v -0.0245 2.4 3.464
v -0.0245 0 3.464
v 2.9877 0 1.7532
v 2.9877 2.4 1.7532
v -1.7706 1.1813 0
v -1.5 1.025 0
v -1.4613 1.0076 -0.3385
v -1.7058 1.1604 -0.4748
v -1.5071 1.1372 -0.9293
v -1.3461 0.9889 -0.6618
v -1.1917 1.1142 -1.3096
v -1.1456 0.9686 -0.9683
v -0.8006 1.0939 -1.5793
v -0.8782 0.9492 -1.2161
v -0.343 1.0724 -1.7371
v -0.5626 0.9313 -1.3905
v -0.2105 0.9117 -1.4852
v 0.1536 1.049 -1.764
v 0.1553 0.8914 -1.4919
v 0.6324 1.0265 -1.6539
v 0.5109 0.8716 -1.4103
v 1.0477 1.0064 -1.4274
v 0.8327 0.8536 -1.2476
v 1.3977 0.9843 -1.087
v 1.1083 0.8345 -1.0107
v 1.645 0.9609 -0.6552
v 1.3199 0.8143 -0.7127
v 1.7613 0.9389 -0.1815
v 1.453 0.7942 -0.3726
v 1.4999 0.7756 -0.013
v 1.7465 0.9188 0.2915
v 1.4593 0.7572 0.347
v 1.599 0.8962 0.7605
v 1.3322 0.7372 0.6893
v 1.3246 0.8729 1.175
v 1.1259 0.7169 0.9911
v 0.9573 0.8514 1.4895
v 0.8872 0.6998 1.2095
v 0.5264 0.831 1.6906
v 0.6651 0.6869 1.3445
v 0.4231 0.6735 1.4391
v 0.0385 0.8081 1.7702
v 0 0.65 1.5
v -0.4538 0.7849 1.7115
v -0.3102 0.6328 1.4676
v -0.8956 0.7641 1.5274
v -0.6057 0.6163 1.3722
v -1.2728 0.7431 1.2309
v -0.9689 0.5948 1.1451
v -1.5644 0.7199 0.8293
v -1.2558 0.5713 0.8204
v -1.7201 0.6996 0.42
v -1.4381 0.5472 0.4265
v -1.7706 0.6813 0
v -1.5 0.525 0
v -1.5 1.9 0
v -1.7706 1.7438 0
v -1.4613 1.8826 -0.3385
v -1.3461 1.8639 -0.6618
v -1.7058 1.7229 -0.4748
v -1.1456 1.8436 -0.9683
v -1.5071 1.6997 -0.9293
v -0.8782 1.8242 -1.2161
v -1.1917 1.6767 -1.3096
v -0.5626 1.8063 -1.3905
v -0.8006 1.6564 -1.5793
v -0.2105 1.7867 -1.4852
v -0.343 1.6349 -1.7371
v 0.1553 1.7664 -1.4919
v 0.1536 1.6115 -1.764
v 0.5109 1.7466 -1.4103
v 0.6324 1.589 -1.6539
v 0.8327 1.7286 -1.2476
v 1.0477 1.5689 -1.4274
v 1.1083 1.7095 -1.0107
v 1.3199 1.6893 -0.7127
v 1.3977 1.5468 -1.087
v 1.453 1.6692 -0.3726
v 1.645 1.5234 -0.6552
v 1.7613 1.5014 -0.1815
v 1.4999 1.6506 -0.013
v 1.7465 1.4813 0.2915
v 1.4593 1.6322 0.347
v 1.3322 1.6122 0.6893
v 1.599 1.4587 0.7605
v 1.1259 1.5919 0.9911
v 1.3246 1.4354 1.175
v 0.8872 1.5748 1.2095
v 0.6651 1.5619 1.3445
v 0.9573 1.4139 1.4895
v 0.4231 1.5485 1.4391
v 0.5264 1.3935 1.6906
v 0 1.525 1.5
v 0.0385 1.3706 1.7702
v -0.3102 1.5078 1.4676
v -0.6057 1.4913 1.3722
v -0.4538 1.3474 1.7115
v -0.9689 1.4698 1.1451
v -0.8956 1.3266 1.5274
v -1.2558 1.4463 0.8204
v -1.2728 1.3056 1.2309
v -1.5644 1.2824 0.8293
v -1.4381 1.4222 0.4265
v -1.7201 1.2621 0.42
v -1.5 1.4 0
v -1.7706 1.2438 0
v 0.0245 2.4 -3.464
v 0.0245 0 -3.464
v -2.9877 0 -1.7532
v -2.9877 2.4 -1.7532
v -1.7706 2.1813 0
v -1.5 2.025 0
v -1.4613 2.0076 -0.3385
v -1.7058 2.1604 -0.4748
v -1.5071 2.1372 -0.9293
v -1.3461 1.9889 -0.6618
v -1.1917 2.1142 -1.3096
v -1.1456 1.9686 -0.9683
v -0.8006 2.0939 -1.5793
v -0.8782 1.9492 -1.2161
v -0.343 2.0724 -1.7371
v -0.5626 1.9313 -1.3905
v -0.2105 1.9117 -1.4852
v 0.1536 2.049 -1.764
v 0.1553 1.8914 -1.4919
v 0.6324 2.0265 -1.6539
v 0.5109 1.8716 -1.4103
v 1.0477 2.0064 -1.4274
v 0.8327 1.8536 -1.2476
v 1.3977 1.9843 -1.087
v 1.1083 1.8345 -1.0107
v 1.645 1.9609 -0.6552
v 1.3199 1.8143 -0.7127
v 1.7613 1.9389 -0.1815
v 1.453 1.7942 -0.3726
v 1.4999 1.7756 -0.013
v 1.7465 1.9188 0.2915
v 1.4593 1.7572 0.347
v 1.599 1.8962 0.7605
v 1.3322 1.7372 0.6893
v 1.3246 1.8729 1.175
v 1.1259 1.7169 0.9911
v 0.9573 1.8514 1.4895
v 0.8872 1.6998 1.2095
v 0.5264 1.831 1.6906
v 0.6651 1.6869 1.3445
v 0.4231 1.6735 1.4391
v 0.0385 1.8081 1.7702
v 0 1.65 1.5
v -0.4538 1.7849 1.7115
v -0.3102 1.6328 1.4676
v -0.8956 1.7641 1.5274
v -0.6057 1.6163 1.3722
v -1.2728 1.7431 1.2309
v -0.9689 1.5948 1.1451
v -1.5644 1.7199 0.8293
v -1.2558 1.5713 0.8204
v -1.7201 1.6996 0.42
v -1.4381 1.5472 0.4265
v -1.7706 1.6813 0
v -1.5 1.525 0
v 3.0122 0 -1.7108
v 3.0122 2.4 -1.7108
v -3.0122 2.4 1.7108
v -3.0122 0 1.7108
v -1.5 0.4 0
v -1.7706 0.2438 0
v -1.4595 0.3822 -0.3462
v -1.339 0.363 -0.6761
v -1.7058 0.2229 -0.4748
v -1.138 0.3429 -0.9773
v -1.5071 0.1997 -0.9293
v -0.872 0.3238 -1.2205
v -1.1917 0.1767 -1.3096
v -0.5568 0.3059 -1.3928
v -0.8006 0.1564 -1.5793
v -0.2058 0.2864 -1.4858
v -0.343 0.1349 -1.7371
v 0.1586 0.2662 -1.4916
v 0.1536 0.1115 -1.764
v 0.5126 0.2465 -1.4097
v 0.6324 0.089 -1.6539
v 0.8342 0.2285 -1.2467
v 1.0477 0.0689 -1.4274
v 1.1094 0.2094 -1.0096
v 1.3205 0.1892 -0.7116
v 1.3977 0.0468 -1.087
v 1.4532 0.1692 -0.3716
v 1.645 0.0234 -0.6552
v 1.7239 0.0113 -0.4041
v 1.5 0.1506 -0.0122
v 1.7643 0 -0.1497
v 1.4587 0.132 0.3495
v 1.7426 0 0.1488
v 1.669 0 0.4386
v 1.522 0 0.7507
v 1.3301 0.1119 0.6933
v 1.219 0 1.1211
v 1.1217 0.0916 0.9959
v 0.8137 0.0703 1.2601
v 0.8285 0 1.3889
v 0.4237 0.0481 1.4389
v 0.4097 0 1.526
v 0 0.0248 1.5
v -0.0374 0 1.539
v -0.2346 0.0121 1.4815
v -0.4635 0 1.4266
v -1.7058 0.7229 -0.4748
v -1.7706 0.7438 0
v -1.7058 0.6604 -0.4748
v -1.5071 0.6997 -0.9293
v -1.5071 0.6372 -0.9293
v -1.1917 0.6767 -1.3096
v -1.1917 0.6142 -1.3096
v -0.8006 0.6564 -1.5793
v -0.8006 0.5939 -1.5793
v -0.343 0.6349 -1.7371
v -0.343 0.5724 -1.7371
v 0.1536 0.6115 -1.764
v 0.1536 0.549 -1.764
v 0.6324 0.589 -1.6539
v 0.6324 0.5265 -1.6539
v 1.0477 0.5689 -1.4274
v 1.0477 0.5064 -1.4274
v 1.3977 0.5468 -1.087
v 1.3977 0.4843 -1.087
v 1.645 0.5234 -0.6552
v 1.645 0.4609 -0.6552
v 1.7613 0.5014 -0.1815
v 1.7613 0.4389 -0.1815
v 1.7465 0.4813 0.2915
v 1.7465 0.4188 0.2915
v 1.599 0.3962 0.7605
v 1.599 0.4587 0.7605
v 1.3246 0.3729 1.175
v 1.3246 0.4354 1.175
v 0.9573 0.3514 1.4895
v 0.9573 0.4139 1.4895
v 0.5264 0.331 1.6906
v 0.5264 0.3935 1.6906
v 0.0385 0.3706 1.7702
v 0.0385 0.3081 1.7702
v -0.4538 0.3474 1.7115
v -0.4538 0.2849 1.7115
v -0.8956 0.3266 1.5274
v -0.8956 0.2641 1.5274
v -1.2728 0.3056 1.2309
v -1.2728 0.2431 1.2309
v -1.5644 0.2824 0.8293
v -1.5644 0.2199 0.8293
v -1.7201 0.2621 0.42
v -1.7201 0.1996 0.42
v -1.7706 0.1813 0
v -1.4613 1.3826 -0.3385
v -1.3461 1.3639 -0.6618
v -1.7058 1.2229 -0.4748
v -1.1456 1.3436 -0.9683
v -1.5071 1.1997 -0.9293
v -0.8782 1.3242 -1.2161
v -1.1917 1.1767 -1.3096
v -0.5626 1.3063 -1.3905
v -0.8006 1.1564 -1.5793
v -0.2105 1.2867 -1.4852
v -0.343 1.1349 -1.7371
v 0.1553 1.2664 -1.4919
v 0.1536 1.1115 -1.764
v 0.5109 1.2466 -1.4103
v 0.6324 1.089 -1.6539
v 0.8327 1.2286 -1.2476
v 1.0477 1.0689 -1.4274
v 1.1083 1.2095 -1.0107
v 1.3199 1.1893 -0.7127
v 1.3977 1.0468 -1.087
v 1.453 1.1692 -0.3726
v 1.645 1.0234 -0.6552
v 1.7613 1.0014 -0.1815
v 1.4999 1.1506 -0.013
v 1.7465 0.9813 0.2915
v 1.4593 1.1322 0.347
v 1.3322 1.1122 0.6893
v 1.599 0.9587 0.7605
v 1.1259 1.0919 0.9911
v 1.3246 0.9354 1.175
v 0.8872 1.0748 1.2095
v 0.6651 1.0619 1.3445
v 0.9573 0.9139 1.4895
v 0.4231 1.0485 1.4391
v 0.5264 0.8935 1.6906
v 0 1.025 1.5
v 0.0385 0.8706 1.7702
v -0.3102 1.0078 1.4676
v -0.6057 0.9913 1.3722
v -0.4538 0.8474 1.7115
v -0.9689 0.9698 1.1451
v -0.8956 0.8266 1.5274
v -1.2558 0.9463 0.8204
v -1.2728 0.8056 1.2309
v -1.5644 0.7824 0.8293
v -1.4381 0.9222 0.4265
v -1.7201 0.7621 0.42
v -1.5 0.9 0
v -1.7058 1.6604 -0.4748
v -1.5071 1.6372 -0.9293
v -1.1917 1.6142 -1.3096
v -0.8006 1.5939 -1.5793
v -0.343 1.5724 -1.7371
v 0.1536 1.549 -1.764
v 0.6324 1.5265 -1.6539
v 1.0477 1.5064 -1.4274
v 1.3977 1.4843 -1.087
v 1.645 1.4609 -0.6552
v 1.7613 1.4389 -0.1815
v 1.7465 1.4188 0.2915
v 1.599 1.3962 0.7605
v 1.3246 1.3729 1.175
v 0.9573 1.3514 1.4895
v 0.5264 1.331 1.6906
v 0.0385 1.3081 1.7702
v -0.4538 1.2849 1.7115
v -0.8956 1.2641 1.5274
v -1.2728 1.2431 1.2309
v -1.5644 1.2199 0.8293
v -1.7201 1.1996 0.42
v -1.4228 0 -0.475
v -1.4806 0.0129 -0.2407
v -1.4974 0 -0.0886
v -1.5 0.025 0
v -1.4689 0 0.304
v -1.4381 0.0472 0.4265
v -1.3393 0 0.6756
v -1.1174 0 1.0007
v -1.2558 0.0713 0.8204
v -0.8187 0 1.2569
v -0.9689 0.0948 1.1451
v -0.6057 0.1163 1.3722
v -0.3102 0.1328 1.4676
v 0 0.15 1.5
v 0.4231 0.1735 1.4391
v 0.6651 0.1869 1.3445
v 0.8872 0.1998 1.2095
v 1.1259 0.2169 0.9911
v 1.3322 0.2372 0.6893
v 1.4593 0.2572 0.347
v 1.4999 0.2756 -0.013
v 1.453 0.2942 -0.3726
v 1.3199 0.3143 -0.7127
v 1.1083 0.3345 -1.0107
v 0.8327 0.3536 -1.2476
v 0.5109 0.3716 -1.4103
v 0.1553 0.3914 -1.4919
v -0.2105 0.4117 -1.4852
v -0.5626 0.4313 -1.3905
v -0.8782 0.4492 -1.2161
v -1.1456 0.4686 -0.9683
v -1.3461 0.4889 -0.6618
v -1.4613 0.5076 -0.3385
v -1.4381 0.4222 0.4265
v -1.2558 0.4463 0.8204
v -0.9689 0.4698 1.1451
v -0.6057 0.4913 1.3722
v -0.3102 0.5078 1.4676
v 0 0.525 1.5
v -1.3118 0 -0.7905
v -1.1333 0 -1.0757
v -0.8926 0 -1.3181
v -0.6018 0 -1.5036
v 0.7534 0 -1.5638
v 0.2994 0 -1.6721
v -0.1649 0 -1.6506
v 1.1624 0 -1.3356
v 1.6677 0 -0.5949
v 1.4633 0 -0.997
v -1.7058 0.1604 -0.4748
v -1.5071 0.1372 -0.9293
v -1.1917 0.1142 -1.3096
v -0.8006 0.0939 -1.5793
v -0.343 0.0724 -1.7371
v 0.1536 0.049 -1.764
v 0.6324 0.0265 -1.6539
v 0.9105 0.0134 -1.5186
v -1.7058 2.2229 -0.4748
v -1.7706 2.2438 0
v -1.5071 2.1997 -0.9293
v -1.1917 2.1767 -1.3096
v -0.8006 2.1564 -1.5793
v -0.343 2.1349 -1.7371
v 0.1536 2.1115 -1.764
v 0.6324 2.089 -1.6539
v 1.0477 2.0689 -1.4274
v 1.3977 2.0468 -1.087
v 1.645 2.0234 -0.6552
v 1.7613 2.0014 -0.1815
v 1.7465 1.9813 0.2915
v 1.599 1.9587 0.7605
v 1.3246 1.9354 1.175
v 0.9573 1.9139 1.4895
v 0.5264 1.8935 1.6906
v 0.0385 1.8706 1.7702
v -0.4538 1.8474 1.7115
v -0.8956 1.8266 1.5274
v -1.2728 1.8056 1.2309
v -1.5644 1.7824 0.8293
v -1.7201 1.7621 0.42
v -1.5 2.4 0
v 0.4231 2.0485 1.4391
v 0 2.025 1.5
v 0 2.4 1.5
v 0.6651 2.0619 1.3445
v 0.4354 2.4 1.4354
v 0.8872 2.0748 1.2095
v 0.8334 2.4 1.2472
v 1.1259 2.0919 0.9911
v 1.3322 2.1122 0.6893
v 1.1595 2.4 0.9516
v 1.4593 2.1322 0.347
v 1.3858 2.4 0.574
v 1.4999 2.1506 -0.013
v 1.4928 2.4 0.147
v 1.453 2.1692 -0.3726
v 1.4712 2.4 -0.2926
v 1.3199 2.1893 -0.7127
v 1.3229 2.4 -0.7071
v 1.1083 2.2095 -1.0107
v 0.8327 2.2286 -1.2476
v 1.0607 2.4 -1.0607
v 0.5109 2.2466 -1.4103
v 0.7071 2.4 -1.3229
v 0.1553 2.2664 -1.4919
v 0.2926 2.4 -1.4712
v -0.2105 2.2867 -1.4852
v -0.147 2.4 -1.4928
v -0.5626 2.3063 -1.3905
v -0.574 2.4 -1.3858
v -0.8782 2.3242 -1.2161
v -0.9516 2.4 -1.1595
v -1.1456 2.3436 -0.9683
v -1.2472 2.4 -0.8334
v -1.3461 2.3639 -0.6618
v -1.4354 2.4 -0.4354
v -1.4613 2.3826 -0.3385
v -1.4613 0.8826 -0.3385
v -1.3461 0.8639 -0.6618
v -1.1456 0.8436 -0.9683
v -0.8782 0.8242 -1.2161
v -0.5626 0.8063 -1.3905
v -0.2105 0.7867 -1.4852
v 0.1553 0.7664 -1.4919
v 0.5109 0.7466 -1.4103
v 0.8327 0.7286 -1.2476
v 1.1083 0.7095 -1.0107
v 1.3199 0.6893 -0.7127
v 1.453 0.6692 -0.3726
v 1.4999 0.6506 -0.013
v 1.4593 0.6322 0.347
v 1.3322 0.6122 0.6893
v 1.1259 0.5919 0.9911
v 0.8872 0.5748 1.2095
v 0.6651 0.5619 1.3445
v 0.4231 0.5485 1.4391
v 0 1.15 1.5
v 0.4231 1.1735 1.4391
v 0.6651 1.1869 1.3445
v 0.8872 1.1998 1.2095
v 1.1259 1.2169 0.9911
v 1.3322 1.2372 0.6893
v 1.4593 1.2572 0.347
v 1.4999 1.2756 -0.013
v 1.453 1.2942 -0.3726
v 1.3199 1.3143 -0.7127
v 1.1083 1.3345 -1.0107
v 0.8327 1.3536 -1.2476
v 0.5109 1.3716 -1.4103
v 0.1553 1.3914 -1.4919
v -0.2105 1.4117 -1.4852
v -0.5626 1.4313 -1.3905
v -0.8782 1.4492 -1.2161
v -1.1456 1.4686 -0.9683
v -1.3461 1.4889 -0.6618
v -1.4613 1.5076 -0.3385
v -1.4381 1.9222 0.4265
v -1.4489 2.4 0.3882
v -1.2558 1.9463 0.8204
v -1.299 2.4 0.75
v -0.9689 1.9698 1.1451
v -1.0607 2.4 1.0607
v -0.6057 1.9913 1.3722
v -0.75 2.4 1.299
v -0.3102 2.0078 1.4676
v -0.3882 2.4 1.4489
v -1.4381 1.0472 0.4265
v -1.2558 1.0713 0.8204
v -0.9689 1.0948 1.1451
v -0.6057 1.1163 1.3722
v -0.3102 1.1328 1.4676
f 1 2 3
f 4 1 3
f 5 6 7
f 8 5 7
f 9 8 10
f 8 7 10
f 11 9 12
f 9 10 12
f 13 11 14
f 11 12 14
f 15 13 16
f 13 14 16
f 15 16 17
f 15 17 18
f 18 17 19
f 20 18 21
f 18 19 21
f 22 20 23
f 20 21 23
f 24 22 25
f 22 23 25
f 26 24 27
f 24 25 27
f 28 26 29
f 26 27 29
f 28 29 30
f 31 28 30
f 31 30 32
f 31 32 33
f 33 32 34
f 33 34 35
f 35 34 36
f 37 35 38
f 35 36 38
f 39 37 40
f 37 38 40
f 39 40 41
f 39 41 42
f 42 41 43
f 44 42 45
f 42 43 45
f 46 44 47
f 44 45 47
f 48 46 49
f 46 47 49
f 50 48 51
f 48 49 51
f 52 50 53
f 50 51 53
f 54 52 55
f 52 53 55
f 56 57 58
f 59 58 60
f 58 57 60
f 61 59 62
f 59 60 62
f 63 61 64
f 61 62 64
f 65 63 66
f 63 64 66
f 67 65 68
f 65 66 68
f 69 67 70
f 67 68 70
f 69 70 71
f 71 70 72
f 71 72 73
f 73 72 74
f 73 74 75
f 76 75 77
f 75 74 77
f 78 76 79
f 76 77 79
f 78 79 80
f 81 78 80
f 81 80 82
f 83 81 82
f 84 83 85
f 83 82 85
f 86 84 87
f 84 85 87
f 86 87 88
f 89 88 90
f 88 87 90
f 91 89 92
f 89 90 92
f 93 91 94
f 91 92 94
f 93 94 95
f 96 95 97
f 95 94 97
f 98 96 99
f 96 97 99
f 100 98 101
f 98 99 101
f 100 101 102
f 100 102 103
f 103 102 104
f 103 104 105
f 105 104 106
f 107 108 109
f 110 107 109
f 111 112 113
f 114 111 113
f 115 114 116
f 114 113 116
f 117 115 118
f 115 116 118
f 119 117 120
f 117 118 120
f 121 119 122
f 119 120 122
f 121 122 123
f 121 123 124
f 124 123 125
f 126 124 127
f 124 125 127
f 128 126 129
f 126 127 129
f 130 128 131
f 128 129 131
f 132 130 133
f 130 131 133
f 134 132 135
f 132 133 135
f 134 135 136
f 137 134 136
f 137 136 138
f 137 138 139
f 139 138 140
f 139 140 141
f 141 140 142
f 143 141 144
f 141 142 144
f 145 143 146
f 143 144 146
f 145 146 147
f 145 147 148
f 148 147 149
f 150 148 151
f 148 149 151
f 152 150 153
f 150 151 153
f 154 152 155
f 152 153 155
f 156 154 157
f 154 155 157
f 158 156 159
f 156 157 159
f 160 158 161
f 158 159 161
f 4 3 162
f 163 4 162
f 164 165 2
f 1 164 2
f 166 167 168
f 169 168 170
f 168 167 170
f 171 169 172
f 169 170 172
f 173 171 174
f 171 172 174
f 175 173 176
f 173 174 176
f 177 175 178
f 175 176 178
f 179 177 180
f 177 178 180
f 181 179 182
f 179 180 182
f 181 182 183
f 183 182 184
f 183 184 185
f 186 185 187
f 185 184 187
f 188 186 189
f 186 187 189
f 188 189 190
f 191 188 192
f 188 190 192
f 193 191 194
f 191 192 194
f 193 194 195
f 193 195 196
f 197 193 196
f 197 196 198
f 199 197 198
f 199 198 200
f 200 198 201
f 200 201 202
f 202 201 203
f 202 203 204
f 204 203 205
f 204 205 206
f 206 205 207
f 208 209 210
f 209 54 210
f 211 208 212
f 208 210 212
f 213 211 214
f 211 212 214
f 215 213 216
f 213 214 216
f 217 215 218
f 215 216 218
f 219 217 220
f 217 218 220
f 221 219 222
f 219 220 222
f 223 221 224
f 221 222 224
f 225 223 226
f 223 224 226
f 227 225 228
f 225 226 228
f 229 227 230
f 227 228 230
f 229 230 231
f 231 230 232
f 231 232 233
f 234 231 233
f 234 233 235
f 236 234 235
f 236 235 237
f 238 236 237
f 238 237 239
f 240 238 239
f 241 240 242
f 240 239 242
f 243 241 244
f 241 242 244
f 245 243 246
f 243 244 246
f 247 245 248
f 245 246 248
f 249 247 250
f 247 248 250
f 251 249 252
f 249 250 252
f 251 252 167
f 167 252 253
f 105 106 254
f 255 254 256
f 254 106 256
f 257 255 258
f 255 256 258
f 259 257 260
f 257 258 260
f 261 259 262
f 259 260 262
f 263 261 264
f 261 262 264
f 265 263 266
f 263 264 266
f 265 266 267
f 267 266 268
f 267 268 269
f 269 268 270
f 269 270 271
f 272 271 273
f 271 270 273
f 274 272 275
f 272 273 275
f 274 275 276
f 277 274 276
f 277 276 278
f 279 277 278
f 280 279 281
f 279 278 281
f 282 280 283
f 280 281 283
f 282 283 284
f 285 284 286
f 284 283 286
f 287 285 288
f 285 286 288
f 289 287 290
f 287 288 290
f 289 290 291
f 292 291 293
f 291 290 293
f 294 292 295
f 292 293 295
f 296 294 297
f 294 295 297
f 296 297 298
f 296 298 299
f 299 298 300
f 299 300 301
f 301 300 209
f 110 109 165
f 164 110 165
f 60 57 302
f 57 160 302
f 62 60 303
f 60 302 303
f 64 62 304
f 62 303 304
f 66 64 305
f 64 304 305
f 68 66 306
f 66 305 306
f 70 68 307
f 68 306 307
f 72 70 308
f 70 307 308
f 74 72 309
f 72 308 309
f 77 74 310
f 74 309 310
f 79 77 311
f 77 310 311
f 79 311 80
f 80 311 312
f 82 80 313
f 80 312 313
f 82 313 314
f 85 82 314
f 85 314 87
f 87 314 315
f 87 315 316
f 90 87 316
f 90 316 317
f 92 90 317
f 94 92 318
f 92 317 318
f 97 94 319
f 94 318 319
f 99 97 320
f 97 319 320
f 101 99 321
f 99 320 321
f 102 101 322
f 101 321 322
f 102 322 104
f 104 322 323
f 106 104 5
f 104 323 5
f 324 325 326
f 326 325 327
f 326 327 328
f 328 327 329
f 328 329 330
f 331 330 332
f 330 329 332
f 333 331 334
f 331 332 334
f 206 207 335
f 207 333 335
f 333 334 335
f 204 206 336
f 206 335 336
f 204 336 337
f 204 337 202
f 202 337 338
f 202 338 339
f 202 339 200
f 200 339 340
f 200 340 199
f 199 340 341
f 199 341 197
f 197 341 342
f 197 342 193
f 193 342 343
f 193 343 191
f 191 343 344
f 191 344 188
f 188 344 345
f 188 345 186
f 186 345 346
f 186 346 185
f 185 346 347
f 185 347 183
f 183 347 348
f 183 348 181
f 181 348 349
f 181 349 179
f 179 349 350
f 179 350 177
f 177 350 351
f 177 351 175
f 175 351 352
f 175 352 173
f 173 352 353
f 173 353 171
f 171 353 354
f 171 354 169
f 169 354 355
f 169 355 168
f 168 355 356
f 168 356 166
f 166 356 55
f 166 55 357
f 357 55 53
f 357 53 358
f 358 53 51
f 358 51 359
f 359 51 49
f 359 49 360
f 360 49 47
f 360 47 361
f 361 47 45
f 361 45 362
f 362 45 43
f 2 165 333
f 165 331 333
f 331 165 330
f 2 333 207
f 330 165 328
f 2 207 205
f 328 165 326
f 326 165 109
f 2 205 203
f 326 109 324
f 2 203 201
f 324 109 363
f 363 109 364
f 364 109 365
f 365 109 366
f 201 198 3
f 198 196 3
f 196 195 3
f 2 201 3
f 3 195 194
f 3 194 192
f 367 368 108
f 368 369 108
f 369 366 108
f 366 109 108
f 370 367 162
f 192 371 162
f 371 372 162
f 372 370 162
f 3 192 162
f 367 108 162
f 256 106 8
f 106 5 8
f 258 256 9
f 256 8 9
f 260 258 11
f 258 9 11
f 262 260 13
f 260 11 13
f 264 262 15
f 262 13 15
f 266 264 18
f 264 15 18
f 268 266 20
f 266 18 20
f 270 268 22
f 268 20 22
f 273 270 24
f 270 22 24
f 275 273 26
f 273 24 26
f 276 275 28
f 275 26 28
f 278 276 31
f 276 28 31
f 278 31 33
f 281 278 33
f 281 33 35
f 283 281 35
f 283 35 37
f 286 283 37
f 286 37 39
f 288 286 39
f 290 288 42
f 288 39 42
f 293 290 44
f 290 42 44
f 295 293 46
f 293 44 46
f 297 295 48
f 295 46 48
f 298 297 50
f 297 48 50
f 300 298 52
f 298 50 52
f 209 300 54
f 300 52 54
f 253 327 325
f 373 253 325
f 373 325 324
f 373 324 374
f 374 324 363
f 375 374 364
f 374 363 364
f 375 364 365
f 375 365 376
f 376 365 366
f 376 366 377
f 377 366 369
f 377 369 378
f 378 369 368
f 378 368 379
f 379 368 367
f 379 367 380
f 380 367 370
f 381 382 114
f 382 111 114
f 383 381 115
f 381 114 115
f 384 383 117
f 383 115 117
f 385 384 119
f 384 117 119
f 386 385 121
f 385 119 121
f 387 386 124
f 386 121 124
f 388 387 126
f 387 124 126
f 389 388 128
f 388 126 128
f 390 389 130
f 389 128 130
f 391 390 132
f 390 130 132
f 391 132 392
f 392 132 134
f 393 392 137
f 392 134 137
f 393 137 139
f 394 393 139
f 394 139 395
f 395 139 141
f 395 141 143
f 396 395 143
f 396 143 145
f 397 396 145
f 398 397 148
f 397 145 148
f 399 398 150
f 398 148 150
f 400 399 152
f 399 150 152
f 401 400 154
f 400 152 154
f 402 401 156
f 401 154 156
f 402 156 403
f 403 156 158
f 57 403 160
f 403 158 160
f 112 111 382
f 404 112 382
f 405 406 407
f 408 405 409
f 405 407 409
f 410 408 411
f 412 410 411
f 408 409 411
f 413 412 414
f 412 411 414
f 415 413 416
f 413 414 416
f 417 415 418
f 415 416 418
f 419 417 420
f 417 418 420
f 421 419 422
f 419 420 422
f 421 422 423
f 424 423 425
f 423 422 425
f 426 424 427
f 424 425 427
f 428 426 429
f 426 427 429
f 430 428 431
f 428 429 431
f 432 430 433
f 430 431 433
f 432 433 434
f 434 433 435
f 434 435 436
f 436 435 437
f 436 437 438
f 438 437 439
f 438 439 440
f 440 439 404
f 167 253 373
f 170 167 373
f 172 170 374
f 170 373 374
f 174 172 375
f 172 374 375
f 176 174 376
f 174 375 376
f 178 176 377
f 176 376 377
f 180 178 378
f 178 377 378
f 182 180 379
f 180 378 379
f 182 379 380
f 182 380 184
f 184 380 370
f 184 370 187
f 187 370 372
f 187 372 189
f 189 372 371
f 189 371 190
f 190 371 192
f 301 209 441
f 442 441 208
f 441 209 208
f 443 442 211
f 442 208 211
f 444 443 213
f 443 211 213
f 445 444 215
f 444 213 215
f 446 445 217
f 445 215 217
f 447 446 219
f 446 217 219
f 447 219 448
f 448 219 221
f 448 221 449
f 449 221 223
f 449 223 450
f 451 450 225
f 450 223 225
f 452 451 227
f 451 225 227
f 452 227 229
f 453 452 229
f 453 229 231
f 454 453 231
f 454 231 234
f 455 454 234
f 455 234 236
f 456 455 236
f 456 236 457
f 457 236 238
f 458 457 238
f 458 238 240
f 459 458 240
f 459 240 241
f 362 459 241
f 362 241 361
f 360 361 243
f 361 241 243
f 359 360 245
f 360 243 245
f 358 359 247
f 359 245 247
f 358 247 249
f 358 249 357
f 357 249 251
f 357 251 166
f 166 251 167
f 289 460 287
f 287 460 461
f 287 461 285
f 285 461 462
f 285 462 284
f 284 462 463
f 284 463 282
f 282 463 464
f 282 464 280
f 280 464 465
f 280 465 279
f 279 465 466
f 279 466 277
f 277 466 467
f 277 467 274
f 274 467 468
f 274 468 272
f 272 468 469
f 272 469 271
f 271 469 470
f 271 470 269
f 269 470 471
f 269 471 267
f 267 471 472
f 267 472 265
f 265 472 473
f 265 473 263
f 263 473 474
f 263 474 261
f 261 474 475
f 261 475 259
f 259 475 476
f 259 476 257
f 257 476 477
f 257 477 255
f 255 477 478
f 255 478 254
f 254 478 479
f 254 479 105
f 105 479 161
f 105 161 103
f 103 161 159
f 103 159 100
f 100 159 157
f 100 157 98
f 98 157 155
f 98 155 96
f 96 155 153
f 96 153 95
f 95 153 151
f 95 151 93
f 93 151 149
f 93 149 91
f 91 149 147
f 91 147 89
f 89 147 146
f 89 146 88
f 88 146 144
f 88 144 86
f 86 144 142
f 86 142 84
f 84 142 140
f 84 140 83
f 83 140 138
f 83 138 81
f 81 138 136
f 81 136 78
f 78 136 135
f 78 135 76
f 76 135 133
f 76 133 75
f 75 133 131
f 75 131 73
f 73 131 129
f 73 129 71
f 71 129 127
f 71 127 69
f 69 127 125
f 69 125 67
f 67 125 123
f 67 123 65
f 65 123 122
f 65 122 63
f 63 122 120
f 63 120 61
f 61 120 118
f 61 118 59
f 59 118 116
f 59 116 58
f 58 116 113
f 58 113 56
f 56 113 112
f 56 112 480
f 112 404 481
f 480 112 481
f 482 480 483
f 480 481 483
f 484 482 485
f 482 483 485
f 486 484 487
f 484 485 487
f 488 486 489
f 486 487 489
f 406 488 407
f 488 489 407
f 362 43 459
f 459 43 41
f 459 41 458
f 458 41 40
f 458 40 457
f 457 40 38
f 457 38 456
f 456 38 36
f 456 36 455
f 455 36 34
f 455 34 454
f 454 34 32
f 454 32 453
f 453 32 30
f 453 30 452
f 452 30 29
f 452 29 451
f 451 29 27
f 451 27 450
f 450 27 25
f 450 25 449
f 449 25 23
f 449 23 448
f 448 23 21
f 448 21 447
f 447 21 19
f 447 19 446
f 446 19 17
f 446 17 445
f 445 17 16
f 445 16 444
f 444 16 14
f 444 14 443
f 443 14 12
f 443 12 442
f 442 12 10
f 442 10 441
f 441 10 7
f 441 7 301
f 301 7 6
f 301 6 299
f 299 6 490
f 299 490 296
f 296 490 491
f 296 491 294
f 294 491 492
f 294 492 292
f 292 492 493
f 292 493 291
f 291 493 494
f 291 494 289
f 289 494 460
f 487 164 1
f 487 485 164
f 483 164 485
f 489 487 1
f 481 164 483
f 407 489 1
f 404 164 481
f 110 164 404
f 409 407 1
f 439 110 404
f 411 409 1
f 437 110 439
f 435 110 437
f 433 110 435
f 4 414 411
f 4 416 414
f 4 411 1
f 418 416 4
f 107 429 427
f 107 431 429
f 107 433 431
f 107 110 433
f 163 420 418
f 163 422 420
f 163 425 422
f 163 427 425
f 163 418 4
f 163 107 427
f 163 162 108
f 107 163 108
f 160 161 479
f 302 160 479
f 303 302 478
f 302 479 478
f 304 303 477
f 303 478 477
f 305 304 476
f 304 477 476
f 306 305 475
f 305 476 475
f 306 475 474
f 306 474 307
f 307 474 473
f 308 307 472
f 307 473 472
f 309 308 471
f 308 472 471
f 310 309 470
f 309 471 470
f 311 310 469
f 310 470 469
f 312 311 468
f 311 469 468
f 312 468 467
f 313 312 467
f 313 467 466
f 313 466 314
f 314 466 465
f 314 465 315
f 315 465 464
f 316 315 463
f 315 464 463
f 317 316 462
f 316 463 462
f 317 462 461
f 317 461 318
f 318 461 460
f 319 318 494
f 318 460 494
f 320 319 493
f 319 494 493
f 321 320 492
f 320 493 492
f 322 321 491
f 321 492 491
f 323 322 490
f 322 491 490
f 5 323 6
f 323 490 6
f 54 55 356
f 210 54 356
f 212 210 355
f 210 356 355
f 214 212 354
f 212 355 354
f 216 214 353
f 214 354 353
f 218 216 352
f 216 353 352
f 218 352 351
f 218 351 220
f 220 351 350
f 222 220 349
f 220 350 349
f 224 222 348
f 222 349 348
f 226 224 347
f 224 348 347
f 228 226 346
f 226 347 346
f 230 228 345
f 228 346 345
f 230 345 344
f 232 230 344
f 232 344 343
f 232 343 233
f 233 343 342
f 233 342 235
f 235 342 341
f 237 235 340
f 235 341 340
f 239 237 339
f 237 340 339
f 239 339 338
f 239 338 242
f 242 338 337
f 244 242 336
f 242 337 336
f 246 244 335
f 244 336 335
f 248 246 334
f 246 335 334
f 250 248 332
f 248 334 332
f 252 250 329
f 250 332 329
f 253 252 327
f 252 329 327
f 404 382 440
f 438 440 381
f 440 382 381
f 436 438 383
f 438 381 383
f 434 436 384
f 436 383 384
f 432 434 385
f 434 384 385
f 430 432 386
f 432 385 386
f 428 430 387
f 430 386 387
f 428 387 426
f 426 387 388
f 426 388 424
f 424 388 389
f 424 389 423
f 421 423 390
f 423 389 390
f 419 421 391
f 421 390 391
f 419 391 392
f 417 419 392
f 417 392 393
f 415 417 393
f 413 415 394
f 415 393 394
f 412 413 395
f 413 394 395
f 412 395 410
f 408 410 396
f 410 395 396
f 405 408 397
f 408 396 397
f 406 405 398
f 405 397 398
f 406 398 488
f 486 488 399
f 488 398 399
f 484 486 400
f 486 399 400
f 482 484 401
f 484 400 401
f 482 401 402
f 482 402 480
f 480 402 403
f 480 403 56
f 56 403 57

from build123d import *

# Parameters (mm, degrees)
BOSS_EXTRUDE1_DEPTH = 2.4
SKETCH2_R           = 1.5
CUT_EXTRUDE1_DEPTH  = 2.4
THREAD2_PITCH       = 0.5


with BuildPart() as part:
    # Sketch1 → Boss-Extrude1 (new body)
    with BuildSketch(Plane(origin=(0, 0, 0), x_dir=(1, 0, 0), z_dir=(0, 1, 0))):
        Polygon((3.012171301, 1.710796321), (0.024492575, 3.464015028), (-2.987678726, 1.753218706), (-3.012171301, -1.710796321), (-0.024492575, -3.464015028), (2.987678726, -1.753218706), align=None)
    extrude(amount=BOSS_EXTRUDE1_DEPTH)

    # Sketch2 → Cut-Extrude1 (cut)
    with BuildSketch(Plane(origin=(0, 2.4, 0), x_dir=(1, 0, 0), z_dir=(0, 1, 0))):
        with Locations(Location((0, 0, 0), (0, 0, 270))):
            Circle(SKETCH2_R)
    extrude(amount=-CUT_EXTRUDE1_DEPTH, mode=Mode.SUBTRACT)

    # Thread2: the profile of Thread Profile2 profile screwed along a right-hand helix of 4.8 turns, 6 arcs to a turn; built about Z, then put on its axis
    thread2_z = Axis((0, 0, 0), (0, 0, 1))
    thread2_corners = [(1.4997, 0, -0.000173205), (1.770632938, 0, 0.156249999), (1.770632938, 0, 0.218749999), (1.4997, 0, 0.375173204)]
    with BuildLine(mode=Mode.PRIVATE) as thread2_profile:
        Line(thread2_corners[0], thread2_corners[1])
        Line(thread2_corners[1], thread2_corners[2])
        Line(thread2_corners[2], thread2_corners[3])
        Line(thread2_corners[3], thread2_corners[0])
    thread2_cap = Face(thread2_profile.wire())
    thread2_turn_angles = [0, 30, 60, 90, 120, 150, 180, 210, 240, 270, 300, 330, 360]
    thread2_turn_weights = [1, 0.8660254037844387, 1, 0.8660254037844387, 1, 0.8660254037844387, 1, 0.8660254037844387, 1, 0.8660254037844387, 1, 0.8660254037844387, 1]
    thread2_turn_rails = [Edge.make_bspline([Vector(p[0], p[1], 0).rotate(thread2_z, thread2_turn_angles[k]) / thread2_turn_weights[k] + Vector(0, 0, p[2] + THREAD2_PITCH * thread2_turn_angles[k] / 360) for k in range(13)], [0, 0, 0, 1, 1, 2, 2, 3, 3, 4, 4, 5, 5, 6, 6, 6], 2, thread2_turn_weights) for p in thread2_corners]
    thread2_turn_sides = [Face.make_surface_from_curves(thread2_turn_rails[p[0]], thread2_turn_rails[p[1]]) for p in [(0, 1), (1, 2), (2, 3), (3, 0)]]
    thread2_last_angles = [1440, 1470, 1500, 1530, 1560, 1590, 1620, 1650, 1680, 1704, 1728]
    thread2_last_weights = [1, 0.8660254037844387, 1, 0.8660254037844387, 1, 0.8660254037844387, 1, 0.8660254037844387, 1, 0.9135454576426009, 1]
    thread2_last_rails = [Edge.make_bspline([Vector(p[0], p[1], 0).rotate(thread2_z, thread2_last_angles[k]) / thread2_last_weights[k] + Vector(0, 0, p[2] + THREAD2_PITCH * thread2_last_angles[k] / 360) for k in range(11)], [0, 0, 0, 1, 1, 2, 2, 3, 3, 4, 4, 5, 5, 5], 2, thread2_last_weights) for p in thread2_corners]
    thread2_last_sides = [Face.make_surface_from_curves(thread2_last_rails[p[0]], thread2_last_rails[p[1]]) for p in [(0, 1), (1, 2), (2, 3), (3, 0)]]
    thread2 = Plane(origin=(0, 2.4, 0), x_dir=(-1, 0, 0), z_dir=(0, -1, 0)) * Solid(Shell([*[p.moved(Location((0, 0, THREAD2_PITCH * i))) for i in range(4) for p in thread2_turn_sides], *thread2_last_sides, thread2_cap, thread2_cap.rotate(thread2_z, 1728).moved(Location((0, 0, THREAD2_PITCH * 1728 / 360)))]))
    add(thread2, mode=Mode.SUBTRACT)


solid = part.part
